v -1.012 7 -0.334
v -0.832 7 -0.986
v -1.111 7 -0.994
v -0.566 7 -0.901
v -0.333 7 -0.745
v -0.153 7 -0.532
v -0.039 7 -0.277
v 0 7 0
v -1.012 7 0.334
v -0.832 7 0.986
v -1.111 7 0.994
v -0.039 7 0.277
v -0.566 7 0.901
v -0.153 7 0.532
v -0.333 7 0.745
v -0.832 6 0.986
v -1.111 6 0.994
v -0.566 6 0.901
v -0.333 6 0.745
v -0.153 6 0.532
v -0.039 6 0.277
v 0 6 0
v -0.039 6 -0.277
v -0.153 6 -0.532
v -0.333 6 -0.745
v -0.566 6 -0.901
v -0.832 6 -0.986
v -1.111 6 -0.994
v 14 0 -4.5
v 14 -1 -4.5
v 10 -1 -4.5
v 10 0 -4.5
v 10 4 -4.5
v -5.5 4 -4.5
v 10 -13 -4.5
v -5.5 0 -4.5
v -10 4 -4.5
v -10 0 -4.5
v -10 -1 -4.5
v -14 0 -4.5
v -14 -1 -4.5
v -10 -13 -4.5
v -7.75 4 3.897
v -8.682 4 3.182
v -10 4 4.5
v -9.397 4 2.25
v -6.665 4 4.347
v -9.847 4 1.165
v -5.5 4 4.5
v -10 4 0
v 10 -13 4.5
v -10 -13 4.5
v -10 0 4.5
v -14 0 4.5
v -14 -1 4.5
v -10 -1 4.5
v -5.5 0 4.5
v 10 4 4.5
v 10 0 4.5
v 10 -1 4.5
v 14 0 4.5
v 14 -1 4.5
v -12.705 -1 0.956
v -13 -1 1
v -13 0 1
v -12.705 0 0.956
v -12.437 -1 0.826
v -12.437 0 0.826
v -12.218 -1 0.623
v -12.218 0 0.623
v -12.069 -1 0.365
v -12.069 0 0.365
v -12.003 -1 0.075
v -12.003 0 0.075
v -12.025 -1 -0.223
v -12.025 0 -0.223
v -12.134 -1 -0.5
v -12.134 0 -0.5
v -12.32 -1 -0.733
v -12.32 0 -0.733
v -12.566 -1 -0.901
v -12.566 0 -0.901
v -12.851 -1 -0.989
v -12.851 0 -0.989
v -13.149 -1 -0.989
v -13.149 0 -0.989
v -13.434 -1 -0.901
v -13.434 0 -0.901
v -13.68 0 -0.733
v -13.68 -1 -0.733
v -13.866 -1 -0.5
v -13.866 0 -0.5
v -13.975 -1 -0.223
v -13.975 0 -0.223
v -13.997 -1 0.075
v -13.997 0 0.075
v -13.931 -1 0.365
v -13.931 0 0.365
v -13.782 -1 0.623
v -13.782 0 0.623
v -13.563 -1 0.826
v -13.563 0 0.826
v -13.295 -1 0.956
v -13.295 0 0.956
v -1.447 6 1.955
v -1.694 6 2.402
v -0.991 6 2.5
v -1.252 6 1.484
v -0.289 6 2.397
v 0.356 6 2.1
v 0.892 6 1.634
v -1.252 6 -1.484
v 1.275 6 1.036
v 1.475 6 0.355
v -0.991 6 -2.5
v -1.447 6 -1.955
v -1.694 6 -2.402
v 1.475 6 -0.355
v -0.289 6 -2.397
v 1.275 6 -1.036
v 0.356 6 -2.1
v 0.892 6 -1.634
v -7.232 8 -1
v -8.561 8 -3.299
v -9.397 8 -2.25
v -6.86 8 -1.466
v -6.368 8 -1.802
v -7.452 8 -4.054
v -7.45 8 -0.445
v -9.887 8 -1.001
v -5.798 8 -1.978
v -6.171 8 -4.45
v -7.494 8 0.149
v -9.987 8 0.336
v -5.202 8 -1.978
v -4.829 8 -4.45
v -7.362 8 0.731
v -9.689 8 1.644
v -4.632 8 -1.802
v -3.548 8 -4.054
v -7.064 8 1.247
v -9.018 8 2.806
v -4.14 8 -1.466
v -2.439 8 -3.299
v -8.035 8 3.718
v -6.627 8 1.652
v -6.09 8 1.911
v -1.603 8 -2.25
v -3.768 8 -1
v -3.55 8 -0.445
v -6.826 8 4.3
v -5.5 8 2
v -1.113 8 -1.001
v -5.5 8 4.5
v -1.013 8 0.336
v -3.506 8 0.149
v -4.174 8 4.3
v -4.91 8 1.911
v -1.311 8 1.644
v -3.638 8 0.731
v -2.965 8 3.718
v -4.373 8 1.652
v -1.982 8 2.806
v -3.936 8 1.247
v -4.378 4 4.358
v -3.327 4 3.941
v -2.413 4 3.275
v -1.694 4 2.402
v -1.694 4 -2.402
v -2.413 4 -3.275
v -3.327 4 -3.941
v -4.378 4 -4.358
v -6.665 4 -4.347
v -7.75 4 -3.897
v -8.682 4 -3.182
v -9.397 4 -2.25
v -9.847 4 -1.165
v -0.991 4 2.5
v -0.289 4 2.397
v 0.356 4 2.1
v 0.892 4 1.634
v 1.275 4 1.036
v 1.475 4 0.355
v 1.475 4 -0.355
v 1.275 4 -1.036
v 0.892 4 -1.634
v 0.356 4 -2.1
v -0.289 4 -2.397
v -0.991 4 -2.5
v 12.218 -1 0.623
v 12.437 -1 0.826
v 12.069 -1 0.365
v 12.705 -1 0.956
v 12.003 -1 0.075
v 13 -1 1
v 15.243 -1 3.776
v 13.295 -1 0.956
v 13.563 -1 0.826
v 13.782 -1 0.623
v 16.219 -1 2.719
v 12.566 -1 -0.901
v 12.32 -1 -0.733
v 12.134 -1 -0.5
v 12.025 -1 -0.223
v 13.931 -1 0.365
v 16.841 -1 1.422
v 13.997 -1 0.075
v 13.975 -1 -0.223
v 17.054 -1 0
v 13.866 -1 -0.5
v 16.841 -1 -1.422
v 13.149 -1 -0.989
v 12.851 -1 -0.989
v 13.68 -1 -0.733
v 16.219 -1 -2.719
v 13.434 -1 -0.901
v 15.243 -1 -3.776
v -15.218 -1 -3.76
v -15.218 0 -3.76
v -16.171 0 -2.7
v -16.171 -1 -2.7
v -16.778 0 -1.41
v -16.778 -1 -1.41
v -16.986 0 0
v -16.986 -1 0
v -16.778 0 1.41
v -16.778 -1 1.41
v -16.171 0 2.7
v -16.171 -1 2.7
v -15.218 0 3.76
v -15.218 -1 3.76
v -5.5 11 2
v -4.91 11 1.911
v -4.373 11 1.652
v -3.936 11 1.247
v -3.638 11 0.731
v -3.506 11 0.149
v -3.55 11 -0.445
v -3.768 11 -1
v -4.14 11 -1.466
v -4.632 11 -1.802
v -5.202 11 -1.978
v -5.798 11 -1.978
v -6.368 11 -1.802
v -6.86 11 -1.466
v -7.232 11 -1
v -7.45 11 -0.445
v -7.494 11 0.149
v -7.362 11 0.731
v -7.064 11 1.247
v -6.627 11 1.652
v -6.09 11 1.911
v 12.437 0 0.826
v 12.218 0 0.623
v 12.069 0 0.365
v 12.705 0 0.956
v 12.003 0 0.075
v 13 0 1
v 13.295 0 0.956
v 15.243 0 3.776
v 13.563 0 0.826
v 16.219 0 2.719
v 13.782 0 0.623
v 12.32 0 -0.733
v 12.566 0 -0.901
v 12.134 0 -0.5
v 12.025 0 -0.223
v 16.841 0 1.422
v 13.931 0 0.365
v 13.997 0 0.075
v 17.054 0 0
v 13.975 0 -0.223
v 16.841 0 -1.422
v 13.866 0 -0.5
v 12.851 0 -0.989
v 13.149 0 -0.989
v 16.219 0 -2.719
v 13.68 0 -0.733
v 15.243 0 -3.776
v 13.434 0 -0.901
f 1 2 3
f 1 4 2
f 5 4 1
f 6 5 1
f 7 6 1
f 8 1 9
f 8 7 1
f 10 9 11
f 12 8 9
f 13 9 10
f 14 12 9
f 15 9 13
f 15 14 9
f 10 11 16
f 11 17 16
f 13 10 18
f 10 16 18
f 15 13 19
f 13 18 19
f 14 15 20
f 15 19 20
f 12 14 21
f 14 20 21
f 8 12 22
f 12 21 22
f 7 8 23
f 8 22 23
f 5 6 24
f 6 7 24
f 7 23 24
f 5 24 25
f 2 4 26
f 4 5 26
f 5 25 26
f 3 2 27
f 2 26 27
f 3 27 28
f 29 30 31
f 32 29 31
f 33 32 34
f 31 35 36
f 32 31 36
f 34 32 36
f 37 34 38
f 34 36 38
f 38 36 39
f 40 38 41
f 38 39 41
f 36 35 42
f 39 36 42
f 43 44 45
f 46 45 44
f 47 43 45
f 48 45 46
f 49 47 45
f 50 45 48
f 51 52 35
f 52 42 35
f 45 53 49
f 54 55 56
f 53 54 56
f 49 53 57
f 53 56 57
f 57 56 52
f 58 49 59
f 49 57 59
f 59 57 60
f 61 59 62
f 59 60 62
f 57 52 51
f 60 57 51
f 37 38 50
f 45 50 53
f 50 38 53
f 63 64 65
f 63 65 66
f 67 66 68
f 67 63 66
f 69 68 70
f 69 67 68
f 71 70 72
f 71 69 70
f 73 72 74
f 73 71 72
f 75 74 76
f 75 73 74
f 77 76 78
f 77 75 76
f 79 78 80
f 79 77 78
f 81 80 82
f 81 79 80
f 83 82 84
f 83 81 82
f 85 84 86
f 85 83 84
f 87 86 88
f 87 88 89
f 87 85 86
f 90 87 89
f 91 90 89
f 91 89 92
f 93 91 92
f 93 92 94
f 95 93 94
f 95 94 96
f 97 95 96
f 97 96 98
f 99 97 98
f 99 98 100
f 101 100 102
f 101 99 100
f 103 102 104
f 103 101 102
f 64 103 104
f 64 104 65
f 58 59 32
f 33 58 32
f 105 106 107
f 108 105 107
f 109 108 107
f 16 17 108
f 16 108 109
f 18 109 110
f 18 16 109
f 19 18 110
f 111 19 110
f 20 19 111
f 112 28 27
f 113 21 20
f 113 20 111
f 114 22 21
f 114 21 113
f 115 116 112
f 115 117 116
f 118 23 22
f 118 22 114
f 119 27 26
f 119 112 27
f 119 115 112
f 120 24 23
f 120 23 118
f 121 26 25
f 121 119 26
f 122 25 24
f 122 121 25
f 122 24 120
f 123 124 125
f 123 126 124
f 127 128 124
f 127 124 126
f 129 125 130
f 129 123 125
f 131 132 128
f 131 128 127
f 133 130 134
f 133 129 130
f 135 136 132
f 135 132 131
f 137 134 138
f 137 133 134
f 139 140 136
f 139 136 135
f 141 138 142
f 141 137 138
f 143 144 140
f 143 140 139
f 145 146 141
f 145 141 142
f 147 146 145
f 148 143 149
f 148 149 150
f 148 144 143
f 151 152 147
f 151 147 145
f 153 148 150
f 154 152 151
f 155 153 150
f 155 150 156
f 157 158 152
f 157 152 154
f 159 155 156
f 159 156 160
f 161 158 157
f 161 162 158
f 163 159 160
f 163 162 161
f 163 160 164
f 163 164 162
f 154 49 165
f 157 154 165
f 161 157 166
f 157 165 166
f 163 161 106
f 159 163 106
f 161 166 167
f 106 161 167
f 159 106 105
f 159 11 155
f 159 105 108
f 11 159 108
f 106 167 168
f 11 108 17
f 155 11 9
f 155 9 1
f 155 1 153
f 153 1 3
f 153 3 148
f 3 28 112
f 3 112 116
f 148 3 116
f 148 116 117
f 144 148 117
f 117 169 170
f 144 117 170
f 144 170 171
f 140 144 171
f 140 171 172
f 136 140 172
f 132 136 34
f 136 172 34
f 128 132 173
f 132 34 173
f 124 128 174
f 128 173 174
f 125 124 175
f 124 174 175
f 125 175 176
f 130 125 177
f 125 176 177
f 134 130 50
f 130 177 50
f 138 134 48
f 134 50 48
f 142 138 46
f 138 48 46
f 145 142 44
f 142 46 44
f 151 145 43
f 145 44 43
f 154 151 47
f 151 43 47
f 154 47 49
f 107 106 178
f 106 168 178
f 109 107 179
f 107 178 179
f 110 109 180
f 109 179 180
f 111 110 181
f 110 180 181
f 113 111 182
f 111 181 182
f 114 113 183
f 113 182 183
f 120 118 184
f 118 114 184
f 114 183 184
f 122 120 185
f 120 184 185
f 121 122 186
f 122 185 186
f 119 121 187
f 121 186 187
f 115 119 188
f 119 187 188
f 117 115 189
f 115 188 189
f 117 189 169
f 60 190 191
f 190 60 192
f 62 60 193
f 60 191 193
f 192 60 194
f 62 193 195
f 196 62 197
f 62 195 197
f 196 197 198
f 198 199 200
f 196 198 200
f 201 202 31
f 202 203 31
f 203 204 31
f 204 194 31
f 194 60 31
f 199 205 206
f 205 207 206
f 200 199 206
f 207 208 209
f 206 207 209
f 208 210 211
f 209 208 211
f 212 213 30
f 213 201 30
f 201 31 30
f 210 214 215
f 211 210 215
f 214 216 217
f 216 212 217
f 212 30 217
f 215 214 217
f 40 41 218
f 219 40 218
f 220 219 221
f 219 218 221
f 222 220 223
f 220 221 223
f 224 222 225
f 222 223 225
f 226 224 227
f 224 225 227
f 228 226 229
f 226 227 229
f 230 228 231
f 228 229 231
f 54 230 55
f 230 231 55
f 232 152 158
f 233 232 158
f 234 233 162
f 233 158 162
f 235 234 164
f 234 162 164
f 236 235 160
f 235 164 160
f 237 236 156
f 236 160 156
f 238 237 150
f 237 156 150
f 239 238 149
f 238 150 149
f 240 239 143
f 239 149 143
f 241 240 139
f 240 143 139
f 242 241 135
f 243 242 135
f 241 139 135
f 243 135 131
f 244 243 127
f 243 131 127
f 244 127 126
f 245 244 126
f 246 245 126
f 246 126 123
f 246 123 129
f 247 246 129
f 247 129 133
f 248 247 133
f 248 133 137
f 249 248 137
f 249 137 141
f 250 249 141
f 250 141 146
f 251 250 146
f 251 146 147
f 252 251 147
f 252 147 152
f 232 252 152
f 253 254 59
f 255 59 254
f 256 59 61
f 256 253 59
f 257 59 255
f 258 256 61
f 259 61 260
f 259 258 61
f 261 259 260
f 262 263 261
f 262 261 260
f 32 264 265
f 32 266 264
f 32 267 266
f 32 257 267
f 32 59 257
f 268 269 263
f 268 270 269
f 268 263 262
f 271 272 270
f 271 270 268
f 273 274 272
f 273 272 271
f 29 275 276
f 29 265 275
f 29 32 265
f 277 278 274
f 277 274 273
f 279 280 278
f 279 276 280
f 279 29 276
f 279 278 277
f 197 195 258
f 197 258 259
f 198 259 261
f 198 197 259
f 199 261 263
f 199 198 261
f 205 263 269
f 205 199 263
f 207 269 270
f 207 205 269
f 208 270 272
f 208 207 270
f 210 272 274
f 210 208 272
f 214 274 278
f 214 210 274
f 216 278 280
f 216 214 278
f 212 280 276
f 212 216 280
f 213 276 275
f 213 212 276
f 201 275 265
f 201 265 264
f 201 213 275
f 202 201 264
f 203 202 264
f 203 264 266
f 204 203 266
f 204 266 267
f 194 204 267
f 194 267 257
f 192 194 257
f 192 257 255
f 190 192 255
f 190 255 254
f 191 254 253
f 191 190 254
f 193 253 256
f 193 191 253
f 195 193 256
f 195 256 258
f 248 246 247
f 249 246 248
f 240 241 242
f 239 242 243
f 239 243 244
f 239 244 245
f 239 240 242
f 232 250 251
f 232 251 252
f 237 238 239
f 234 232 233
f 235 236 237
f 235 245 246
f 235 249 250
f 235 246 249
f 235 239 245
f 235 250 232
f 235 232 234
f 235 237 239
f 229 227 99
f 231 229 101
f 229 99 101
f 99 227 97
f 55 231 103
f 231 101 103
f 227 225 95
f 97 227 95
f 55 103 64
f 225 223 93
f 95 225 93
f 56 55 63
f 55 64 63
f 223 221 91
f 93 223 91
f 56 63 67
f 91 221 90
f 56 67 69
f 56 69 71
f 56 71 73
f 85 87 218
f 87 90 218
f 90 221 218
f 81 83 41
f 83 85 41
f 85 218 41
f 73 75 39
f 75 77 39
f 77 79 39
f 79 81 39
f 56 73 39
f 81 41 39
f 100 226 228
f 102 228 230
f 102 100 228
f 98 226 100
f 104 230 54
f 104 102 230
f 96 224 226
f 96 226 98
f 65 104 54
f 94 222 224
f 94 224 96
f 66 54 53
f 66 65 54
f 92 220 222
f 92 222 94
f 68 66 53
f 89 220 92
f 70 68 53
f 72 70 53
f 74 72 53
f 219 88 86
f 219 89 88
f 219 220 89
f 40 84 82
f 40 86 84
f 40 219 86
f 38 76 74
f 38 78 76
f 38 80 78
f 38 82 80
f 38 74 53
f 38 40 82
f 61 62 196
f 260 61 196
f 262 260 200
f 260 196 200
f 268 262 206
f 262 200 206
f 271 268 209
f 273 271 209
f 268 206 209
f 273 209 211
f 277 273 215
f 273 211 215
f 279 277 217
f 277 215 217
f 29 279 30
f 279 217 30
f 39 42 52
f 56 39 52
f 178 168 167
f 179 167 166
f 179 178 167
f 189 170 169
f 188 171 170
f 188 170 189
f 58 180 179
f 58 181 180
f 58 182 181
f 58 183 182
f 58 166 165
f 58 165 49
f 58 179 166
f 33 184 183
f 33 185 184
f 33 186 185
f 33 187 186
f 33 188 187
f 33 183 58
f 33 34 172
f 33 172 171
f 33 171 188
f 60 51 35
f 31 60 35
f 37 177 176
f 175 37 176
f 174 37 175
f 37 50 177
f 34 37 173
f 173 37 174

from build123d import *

# Parameters (mm, degrees)
BOSS_EXTRUDE3_DEPTH      = 4
BOSS_EXTRUDE3_DEPTH_BACK = 13
SKETCH1_W                = 20
SKETCH1_H                = 9
BOSS_EXTRUDE4_DEPTH      = 0.0001
BOSS_EXTRUDE4_DEPTH_BACK = 1
SKETCH1_3_R              = 1
SKETCH1_8_R              = 1
BOSS_EXTRUDE6_DEPTH      = 7
SKETCH1_9_R              = 2
BOSS_EXTRUDE7_DEPTH      = 11
SKETCH1_11_R             = 4.5
BOSS_EXTRUDE10_DEPTH     = 8
SKETCH1_12_R             = 2.5
BOSS_EXTRUDE11_DEPTH     = 6


with BuildPart() as part:
    # Sketch1 → Boss-Extrude3 (new, two sides: drawn at the far end of the back side and taken through both)
    with BuildSketch(Plane(origin=(0, 0, 0), x_dir=(1, 0, 0), z_dir=(0, 1, 0)).offset(-BOSS_EXTRUDE3_DEPTH_BACK)):
        Rectangle(SKETCH1_W, SKETCH1_H)
    extrude(amount=BOSS_EXTRUDE3_DEPTH + BOSS_EXTRUDE3_DEPTH_BACK)

    # Sketch1<3> → Boss-Extrude4 (add, two sides: drawn at the far end of the back side and taken through both)
    # profile 1 of 2: a face of its own
    with BuildSketch(Plane(origin=(0, 0, 0), x_dir=(1, 0, 0), z_dir=(0, 1, 0)).offset(-BOSS_EXTRUDE4_DEPTH_BACK)):
        with BuildLine():
            Line((-14, -4.5), (-10, -4.5))
            Line((-10, -4.5), (-10, 4.5))
            Line((-10, 4.5), (-14, 4.5))
            ThreePointArc((-14, 4.5), (-16.985823737, 0), (-14, -4.5))
        make_face()
        with Locations((-13, 0)):
            Circle(SKETCH1_3_R, mode=Mode.SUBTRACT)
    # profile 2 of 2: a face of its own
    with BuildSketch(Plane(origin=(0, 0, 0), x_dir=(1, 0, 0), z_dir=(0, 1, 0)).offset(-BOSS_EXTRUDE4_DEPTH_BACK)):
        with BuildLine():
            Line((10, 4.5), (10, -4.5))
            Line((10, -4.5), (14, -4.5))
            ThreePointArc((14, -4.5), (17.054182563, 0), (14, 4.5))
            Line((14, 4.5), (10, 4.5))
        make_face()
        with Locations((13, 0)):
            Circle(SKETCH1_3_R, mode=Mode.SUBTRACT)
    extrude(amount=BOSS_EXTRUDE4_DEPTH + BOSS_EXTRUDE4_DEPTH_BACK)

    # Sketch1<8> → Boss-Extrude6 (add)
    with BuildSketch(Plane(origin=(0, 0, 0), x_dir=(1, 0, 0), z_dir=(0, 1, 0))):
        with Locations((-1, 0)):
            Circle(SKETCH1_8_R)
    extrude(amount=BOSS_EXTRUDE6_DEPTH)

    # Sketch1<9> → Boss-Extrude7 (add)
    with BuildSketch(Plane(origin=(0, 0, 0), x_dir=(1, 0, 0), z_dir=(0, 1, 0))):
        with Locations((-5.5, 0)):
            Circle(SKETCH1_9_R)
    extrude(amount=BOSS_EXTRUDE7_DEPTH)

    # Sketch1<11> → Boss-Extrude10 (add)
    with BuildSketch(Plane(origin=(0, 0, 0), x_dir=(1, 0, 0), z_dir=(0, 1, 0))):
        with Locations((-5.5, 0)):
            Circle(SKETCH1_11_R)
    extrude(amount=BOSS_EXTRUDE10_DEPTH)

    # Sketch1<12> → Boss-Extrude11 (add)
    with BuildSketch(Plane(origin=(0, 0, 0), x_dir=(1, 0, 0), z_dir=(0, 1, 0))):
        with Locations((-1, 0)):
            Circle(SKETCH1_12_R)
    extrude(amount=BOSS_EXTRUDE11_DEPTH)


solid = part.part
